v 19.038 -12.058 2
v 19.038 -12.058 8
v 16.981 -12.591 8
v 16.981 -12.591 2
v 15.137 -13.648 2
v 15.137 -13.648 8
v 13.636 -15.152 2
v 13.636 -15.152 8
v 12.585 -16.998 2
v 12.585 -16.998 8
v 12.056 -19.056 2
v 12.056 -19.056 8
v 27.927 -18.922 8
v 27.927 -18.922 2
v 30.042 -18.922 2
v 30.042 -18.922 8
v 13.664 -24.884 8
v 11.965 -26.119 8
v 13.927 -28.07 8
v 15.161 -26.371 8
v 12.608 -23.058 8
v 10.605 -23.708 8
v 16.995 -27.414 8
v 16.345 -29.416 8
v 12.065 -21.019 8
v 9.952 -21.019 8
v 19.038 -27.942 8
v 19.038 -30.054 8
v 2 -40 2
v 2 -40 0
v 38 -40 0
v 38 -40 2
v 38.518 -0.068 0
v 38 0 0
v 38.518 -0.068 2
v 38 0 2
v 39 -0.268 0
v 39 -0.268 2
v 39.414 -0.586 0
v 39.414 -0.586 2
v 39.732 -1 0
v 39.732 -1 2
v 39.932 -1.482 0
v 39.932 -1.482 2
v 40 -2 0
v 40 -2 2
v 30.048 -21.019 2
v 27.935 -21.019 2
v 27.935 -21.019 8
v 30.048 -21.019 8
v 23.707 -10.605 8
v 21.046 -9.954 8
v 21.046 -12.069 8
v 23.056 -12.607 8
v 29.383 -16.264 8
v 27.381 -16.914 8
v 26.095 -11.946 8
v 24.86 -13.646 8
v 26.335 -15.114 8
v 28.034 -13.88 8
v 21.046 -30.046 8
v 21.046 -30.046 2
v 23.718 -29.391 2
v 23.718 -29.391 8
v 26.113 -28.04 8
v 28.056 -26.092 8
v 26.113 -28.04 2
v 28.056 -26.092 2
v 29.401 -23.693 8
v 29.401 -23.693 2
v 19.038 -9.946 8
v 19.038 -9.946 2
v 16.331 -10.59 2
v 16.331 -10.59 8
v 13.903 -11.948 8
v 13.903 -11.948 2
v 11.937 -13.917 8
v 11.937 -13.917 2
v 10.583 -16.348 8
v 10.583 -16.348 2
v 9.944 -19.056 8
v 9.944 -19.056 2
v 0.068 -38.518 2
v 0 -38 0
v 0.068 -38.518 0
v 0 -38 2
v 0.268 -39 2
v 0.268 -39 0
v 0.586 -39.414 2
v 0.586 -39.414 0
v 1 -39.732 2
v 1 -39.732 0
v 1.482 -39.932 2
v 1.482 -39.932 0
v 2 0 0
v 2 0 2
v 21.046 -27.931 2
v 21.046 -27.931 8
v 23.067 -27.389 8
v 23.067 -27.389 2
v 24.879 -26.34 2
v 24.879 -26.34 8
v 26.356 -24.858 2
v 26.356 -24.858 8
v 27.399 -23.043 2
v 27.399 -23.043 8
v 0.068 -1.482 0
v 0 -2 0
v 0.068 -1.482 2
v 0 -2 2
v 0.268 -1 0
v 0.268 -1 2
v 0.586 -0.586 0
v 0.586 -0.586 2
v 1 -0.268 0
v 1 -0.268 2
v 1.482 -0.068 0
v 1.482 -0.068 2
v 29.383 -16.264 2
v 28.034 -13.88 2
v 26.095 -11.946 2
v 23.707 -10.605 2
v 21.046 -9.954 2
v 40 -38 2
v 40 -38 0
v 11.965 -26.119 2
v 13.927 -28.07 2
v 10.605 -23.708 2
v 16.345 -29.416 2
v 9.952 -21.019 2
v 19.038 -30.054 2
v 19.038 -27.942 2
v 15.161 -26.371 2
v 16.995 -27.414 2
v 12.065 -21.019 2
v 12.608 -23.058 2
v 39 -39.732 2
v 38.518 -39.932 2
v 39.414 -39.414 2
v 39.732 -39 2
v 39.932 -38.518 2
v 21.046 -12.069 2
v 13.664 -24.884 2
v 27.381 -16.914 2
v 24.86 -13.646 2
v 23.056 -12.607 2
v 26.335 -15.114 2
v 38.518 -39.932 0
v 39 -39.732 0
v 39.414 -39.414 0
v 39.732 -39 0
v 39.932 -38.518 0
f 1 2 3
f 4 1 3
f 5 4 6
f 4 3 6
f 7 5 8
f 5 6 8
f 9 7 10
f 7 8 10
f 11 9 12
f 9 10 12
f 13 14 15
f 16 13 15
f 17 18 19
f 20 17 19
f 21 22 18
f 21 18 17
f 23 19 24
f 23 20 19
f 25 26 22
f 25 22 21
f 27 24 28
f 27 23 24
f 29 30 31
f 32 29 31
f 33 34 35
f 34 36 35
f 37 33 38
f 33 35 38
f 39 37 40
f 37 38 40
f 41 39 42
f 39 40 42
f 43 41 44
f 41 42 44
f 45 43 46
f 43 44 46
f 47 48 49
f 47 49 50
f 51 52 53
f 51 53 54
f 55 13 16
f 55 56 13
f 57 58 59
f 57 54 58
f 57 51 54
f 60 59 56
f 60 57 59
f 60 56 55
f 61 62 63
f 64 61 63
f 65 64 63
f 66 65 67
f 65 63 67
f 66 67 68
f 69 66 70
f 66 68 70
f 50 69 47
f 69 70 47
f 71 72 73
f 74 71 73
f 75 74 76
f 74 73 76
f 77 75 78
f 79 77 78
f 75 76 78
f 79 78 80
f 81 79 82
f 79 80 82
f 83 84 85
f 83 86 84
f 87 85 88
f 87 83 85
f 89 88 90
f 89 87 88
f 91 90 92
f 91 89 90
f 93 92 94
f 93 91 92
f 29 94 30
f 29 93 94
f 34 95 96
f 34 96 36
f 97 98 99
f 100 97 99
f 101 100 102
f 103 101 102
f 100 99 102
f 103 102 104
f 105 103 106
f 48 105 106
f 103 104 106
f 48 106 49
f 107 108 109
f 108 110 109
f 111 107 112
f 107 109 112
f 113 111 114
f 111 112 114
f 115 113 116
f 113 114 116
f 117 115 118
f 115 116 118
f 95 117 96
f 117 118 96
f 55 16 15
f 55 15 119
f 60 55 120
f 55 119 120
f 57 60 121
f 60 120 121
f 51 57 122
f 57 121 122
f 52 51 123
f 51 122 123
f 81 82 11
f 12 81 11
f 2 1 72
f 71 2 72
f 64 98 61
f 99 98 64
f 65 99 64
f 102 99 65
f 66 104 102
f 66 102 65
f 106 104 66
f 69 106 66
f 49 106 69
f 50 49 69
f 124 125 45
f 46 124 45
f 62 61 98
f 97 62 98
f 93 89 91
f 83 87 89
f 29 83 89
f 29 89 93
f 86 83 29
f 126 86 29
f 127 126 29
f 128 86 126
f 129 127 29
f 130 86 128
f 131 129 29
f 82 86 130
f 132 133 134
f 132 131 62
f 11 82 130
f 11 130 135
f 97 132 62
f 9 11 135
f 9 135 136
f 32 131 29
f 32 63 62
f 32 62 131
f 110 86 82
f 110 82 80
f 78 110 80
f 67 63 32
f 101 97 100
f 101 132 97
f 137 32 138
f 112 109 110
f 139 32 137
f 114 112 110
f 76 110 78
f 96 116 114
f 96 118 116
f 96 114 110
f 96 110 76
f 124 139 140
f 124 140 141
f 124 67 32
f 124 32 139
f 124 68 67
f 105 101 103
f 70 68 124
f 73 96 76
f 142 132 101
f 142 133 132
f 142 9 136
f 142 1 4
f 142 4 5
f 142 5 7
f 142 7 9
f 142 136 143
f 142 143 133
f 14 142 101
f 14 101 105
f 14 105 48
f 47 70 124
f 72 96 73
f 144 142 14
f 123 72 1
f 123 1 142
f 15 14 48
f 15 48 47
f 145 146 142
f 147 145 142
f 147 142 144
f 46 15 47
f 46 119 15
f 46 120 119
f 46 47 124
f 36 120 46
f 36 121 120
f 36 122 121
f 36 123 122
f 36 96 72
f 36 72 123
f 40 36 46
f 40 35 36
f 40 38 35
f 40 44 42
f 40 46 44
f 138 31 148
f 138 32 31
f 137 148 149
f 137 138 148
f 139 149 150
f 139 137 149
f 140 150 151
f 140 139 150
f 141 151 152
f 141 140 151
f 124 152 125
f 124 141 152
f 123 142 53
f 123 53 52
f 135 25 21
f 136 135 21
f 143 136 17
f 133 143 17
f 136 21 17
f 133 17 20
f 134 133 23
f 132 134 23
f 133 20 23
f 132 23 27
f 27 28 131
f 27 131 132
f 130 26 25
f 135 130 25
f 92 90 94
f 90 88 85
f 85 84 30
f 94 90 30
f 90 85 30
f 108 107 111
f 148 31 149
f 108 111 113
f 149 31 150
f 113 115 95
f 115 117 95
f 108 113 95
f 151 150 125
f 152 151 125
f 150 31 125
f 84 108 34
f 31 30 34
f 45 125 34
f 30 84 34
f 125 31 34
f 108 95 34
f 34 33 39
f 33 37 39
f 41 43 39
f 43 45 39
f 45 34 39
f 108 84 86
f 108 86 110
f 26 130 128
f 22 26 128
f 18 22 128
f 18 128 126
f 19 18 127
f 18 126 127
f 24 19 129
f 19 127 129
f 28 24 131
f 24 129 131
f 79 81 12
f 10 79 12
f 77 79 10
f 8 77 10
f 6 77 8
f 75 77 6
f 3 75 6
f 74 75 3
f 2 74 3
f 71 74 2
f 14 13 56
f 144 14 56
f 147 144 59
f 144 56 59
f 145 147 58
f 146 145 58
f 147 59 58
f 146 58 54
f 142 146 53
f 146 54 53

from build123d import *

# Parameters (mm, degrees)
SKETCH_W        = 40
SKETCH_H        = 40
PAD_DEPTH       = 2
SKETCH001_R     = 10.1
PAD001_DEPTH    = 6
SKETCH002_R     = 8
POCKET_DEPTH    = 6
SKETCH003_W     = 2.007961
SKETCH003_H     = 21.864484
SKETCH003_W_2   = 7.094803
SKETCH003_H_2   = 2.097204
SKETCH003_W_3   = 6.916317
SKETCH003_H_3   = 1.96334
POCKET001_DEPTH = 6
FILLET_R        = 2


with BuildPart() as part:
    # Sketch → Pad (new body)
    with BuildSketch(Plane.XY):
        with Locations((20, -20)):
            Rectangle(SKETCH_W, SKETCH_H)
    extrude(amount=PAD_DEPTH)

    # Sketch001 (on Face6 of Pad) → Pad001 (join)
    with BuildSketch(Plane.XY.offset(2)):
        with Locations((20, -20)):
            Circle(SKETCH001_R)
    extrude(amount=PAD001_DEPTH)

    # Sketch002 (on Face8 of Pad001) → Pocket (cut)
    with BuildSketch(Plane.XY.offset(8)):
        with Locations((20, -20)):
            Circle(SKETCH002_R)
    extrude(amount=-POCKET_DEPTH, mode=Mode.SUBTRACT)

    # Sketch003 (on Face8 of Pocket) → Pocket001 (cut)
    with BuildSketch(Plane.XY.offset(8)):
        with Locations((20.041939, -19.903789)):
            Rectangle(SKETCH003_W, SKETCH003_H)
        with Locations((28.520004, -19.970721)):
            Rectangle(SKETCH003_W_2, SKETCH003_H_2)
        with Locations((12.456301, -20.037653)):
            Rectangle(SKETCH003_W_3, SKETCH003_H_3)
    extrude(amount=-POCKET001_DEPTH, mode=Mode.SUBTRACT)

    # Fillet
    fillet_edges = [part.edges().sort_by_distance(p)[0] for p in [
        (40, -40, 1),
        (40, 0, 1),
        (0, -40, 1),
        (0, 0, 1),
    ]]
    fillet(fillet_edges, radius=FILLET_R)


solid = part.part
